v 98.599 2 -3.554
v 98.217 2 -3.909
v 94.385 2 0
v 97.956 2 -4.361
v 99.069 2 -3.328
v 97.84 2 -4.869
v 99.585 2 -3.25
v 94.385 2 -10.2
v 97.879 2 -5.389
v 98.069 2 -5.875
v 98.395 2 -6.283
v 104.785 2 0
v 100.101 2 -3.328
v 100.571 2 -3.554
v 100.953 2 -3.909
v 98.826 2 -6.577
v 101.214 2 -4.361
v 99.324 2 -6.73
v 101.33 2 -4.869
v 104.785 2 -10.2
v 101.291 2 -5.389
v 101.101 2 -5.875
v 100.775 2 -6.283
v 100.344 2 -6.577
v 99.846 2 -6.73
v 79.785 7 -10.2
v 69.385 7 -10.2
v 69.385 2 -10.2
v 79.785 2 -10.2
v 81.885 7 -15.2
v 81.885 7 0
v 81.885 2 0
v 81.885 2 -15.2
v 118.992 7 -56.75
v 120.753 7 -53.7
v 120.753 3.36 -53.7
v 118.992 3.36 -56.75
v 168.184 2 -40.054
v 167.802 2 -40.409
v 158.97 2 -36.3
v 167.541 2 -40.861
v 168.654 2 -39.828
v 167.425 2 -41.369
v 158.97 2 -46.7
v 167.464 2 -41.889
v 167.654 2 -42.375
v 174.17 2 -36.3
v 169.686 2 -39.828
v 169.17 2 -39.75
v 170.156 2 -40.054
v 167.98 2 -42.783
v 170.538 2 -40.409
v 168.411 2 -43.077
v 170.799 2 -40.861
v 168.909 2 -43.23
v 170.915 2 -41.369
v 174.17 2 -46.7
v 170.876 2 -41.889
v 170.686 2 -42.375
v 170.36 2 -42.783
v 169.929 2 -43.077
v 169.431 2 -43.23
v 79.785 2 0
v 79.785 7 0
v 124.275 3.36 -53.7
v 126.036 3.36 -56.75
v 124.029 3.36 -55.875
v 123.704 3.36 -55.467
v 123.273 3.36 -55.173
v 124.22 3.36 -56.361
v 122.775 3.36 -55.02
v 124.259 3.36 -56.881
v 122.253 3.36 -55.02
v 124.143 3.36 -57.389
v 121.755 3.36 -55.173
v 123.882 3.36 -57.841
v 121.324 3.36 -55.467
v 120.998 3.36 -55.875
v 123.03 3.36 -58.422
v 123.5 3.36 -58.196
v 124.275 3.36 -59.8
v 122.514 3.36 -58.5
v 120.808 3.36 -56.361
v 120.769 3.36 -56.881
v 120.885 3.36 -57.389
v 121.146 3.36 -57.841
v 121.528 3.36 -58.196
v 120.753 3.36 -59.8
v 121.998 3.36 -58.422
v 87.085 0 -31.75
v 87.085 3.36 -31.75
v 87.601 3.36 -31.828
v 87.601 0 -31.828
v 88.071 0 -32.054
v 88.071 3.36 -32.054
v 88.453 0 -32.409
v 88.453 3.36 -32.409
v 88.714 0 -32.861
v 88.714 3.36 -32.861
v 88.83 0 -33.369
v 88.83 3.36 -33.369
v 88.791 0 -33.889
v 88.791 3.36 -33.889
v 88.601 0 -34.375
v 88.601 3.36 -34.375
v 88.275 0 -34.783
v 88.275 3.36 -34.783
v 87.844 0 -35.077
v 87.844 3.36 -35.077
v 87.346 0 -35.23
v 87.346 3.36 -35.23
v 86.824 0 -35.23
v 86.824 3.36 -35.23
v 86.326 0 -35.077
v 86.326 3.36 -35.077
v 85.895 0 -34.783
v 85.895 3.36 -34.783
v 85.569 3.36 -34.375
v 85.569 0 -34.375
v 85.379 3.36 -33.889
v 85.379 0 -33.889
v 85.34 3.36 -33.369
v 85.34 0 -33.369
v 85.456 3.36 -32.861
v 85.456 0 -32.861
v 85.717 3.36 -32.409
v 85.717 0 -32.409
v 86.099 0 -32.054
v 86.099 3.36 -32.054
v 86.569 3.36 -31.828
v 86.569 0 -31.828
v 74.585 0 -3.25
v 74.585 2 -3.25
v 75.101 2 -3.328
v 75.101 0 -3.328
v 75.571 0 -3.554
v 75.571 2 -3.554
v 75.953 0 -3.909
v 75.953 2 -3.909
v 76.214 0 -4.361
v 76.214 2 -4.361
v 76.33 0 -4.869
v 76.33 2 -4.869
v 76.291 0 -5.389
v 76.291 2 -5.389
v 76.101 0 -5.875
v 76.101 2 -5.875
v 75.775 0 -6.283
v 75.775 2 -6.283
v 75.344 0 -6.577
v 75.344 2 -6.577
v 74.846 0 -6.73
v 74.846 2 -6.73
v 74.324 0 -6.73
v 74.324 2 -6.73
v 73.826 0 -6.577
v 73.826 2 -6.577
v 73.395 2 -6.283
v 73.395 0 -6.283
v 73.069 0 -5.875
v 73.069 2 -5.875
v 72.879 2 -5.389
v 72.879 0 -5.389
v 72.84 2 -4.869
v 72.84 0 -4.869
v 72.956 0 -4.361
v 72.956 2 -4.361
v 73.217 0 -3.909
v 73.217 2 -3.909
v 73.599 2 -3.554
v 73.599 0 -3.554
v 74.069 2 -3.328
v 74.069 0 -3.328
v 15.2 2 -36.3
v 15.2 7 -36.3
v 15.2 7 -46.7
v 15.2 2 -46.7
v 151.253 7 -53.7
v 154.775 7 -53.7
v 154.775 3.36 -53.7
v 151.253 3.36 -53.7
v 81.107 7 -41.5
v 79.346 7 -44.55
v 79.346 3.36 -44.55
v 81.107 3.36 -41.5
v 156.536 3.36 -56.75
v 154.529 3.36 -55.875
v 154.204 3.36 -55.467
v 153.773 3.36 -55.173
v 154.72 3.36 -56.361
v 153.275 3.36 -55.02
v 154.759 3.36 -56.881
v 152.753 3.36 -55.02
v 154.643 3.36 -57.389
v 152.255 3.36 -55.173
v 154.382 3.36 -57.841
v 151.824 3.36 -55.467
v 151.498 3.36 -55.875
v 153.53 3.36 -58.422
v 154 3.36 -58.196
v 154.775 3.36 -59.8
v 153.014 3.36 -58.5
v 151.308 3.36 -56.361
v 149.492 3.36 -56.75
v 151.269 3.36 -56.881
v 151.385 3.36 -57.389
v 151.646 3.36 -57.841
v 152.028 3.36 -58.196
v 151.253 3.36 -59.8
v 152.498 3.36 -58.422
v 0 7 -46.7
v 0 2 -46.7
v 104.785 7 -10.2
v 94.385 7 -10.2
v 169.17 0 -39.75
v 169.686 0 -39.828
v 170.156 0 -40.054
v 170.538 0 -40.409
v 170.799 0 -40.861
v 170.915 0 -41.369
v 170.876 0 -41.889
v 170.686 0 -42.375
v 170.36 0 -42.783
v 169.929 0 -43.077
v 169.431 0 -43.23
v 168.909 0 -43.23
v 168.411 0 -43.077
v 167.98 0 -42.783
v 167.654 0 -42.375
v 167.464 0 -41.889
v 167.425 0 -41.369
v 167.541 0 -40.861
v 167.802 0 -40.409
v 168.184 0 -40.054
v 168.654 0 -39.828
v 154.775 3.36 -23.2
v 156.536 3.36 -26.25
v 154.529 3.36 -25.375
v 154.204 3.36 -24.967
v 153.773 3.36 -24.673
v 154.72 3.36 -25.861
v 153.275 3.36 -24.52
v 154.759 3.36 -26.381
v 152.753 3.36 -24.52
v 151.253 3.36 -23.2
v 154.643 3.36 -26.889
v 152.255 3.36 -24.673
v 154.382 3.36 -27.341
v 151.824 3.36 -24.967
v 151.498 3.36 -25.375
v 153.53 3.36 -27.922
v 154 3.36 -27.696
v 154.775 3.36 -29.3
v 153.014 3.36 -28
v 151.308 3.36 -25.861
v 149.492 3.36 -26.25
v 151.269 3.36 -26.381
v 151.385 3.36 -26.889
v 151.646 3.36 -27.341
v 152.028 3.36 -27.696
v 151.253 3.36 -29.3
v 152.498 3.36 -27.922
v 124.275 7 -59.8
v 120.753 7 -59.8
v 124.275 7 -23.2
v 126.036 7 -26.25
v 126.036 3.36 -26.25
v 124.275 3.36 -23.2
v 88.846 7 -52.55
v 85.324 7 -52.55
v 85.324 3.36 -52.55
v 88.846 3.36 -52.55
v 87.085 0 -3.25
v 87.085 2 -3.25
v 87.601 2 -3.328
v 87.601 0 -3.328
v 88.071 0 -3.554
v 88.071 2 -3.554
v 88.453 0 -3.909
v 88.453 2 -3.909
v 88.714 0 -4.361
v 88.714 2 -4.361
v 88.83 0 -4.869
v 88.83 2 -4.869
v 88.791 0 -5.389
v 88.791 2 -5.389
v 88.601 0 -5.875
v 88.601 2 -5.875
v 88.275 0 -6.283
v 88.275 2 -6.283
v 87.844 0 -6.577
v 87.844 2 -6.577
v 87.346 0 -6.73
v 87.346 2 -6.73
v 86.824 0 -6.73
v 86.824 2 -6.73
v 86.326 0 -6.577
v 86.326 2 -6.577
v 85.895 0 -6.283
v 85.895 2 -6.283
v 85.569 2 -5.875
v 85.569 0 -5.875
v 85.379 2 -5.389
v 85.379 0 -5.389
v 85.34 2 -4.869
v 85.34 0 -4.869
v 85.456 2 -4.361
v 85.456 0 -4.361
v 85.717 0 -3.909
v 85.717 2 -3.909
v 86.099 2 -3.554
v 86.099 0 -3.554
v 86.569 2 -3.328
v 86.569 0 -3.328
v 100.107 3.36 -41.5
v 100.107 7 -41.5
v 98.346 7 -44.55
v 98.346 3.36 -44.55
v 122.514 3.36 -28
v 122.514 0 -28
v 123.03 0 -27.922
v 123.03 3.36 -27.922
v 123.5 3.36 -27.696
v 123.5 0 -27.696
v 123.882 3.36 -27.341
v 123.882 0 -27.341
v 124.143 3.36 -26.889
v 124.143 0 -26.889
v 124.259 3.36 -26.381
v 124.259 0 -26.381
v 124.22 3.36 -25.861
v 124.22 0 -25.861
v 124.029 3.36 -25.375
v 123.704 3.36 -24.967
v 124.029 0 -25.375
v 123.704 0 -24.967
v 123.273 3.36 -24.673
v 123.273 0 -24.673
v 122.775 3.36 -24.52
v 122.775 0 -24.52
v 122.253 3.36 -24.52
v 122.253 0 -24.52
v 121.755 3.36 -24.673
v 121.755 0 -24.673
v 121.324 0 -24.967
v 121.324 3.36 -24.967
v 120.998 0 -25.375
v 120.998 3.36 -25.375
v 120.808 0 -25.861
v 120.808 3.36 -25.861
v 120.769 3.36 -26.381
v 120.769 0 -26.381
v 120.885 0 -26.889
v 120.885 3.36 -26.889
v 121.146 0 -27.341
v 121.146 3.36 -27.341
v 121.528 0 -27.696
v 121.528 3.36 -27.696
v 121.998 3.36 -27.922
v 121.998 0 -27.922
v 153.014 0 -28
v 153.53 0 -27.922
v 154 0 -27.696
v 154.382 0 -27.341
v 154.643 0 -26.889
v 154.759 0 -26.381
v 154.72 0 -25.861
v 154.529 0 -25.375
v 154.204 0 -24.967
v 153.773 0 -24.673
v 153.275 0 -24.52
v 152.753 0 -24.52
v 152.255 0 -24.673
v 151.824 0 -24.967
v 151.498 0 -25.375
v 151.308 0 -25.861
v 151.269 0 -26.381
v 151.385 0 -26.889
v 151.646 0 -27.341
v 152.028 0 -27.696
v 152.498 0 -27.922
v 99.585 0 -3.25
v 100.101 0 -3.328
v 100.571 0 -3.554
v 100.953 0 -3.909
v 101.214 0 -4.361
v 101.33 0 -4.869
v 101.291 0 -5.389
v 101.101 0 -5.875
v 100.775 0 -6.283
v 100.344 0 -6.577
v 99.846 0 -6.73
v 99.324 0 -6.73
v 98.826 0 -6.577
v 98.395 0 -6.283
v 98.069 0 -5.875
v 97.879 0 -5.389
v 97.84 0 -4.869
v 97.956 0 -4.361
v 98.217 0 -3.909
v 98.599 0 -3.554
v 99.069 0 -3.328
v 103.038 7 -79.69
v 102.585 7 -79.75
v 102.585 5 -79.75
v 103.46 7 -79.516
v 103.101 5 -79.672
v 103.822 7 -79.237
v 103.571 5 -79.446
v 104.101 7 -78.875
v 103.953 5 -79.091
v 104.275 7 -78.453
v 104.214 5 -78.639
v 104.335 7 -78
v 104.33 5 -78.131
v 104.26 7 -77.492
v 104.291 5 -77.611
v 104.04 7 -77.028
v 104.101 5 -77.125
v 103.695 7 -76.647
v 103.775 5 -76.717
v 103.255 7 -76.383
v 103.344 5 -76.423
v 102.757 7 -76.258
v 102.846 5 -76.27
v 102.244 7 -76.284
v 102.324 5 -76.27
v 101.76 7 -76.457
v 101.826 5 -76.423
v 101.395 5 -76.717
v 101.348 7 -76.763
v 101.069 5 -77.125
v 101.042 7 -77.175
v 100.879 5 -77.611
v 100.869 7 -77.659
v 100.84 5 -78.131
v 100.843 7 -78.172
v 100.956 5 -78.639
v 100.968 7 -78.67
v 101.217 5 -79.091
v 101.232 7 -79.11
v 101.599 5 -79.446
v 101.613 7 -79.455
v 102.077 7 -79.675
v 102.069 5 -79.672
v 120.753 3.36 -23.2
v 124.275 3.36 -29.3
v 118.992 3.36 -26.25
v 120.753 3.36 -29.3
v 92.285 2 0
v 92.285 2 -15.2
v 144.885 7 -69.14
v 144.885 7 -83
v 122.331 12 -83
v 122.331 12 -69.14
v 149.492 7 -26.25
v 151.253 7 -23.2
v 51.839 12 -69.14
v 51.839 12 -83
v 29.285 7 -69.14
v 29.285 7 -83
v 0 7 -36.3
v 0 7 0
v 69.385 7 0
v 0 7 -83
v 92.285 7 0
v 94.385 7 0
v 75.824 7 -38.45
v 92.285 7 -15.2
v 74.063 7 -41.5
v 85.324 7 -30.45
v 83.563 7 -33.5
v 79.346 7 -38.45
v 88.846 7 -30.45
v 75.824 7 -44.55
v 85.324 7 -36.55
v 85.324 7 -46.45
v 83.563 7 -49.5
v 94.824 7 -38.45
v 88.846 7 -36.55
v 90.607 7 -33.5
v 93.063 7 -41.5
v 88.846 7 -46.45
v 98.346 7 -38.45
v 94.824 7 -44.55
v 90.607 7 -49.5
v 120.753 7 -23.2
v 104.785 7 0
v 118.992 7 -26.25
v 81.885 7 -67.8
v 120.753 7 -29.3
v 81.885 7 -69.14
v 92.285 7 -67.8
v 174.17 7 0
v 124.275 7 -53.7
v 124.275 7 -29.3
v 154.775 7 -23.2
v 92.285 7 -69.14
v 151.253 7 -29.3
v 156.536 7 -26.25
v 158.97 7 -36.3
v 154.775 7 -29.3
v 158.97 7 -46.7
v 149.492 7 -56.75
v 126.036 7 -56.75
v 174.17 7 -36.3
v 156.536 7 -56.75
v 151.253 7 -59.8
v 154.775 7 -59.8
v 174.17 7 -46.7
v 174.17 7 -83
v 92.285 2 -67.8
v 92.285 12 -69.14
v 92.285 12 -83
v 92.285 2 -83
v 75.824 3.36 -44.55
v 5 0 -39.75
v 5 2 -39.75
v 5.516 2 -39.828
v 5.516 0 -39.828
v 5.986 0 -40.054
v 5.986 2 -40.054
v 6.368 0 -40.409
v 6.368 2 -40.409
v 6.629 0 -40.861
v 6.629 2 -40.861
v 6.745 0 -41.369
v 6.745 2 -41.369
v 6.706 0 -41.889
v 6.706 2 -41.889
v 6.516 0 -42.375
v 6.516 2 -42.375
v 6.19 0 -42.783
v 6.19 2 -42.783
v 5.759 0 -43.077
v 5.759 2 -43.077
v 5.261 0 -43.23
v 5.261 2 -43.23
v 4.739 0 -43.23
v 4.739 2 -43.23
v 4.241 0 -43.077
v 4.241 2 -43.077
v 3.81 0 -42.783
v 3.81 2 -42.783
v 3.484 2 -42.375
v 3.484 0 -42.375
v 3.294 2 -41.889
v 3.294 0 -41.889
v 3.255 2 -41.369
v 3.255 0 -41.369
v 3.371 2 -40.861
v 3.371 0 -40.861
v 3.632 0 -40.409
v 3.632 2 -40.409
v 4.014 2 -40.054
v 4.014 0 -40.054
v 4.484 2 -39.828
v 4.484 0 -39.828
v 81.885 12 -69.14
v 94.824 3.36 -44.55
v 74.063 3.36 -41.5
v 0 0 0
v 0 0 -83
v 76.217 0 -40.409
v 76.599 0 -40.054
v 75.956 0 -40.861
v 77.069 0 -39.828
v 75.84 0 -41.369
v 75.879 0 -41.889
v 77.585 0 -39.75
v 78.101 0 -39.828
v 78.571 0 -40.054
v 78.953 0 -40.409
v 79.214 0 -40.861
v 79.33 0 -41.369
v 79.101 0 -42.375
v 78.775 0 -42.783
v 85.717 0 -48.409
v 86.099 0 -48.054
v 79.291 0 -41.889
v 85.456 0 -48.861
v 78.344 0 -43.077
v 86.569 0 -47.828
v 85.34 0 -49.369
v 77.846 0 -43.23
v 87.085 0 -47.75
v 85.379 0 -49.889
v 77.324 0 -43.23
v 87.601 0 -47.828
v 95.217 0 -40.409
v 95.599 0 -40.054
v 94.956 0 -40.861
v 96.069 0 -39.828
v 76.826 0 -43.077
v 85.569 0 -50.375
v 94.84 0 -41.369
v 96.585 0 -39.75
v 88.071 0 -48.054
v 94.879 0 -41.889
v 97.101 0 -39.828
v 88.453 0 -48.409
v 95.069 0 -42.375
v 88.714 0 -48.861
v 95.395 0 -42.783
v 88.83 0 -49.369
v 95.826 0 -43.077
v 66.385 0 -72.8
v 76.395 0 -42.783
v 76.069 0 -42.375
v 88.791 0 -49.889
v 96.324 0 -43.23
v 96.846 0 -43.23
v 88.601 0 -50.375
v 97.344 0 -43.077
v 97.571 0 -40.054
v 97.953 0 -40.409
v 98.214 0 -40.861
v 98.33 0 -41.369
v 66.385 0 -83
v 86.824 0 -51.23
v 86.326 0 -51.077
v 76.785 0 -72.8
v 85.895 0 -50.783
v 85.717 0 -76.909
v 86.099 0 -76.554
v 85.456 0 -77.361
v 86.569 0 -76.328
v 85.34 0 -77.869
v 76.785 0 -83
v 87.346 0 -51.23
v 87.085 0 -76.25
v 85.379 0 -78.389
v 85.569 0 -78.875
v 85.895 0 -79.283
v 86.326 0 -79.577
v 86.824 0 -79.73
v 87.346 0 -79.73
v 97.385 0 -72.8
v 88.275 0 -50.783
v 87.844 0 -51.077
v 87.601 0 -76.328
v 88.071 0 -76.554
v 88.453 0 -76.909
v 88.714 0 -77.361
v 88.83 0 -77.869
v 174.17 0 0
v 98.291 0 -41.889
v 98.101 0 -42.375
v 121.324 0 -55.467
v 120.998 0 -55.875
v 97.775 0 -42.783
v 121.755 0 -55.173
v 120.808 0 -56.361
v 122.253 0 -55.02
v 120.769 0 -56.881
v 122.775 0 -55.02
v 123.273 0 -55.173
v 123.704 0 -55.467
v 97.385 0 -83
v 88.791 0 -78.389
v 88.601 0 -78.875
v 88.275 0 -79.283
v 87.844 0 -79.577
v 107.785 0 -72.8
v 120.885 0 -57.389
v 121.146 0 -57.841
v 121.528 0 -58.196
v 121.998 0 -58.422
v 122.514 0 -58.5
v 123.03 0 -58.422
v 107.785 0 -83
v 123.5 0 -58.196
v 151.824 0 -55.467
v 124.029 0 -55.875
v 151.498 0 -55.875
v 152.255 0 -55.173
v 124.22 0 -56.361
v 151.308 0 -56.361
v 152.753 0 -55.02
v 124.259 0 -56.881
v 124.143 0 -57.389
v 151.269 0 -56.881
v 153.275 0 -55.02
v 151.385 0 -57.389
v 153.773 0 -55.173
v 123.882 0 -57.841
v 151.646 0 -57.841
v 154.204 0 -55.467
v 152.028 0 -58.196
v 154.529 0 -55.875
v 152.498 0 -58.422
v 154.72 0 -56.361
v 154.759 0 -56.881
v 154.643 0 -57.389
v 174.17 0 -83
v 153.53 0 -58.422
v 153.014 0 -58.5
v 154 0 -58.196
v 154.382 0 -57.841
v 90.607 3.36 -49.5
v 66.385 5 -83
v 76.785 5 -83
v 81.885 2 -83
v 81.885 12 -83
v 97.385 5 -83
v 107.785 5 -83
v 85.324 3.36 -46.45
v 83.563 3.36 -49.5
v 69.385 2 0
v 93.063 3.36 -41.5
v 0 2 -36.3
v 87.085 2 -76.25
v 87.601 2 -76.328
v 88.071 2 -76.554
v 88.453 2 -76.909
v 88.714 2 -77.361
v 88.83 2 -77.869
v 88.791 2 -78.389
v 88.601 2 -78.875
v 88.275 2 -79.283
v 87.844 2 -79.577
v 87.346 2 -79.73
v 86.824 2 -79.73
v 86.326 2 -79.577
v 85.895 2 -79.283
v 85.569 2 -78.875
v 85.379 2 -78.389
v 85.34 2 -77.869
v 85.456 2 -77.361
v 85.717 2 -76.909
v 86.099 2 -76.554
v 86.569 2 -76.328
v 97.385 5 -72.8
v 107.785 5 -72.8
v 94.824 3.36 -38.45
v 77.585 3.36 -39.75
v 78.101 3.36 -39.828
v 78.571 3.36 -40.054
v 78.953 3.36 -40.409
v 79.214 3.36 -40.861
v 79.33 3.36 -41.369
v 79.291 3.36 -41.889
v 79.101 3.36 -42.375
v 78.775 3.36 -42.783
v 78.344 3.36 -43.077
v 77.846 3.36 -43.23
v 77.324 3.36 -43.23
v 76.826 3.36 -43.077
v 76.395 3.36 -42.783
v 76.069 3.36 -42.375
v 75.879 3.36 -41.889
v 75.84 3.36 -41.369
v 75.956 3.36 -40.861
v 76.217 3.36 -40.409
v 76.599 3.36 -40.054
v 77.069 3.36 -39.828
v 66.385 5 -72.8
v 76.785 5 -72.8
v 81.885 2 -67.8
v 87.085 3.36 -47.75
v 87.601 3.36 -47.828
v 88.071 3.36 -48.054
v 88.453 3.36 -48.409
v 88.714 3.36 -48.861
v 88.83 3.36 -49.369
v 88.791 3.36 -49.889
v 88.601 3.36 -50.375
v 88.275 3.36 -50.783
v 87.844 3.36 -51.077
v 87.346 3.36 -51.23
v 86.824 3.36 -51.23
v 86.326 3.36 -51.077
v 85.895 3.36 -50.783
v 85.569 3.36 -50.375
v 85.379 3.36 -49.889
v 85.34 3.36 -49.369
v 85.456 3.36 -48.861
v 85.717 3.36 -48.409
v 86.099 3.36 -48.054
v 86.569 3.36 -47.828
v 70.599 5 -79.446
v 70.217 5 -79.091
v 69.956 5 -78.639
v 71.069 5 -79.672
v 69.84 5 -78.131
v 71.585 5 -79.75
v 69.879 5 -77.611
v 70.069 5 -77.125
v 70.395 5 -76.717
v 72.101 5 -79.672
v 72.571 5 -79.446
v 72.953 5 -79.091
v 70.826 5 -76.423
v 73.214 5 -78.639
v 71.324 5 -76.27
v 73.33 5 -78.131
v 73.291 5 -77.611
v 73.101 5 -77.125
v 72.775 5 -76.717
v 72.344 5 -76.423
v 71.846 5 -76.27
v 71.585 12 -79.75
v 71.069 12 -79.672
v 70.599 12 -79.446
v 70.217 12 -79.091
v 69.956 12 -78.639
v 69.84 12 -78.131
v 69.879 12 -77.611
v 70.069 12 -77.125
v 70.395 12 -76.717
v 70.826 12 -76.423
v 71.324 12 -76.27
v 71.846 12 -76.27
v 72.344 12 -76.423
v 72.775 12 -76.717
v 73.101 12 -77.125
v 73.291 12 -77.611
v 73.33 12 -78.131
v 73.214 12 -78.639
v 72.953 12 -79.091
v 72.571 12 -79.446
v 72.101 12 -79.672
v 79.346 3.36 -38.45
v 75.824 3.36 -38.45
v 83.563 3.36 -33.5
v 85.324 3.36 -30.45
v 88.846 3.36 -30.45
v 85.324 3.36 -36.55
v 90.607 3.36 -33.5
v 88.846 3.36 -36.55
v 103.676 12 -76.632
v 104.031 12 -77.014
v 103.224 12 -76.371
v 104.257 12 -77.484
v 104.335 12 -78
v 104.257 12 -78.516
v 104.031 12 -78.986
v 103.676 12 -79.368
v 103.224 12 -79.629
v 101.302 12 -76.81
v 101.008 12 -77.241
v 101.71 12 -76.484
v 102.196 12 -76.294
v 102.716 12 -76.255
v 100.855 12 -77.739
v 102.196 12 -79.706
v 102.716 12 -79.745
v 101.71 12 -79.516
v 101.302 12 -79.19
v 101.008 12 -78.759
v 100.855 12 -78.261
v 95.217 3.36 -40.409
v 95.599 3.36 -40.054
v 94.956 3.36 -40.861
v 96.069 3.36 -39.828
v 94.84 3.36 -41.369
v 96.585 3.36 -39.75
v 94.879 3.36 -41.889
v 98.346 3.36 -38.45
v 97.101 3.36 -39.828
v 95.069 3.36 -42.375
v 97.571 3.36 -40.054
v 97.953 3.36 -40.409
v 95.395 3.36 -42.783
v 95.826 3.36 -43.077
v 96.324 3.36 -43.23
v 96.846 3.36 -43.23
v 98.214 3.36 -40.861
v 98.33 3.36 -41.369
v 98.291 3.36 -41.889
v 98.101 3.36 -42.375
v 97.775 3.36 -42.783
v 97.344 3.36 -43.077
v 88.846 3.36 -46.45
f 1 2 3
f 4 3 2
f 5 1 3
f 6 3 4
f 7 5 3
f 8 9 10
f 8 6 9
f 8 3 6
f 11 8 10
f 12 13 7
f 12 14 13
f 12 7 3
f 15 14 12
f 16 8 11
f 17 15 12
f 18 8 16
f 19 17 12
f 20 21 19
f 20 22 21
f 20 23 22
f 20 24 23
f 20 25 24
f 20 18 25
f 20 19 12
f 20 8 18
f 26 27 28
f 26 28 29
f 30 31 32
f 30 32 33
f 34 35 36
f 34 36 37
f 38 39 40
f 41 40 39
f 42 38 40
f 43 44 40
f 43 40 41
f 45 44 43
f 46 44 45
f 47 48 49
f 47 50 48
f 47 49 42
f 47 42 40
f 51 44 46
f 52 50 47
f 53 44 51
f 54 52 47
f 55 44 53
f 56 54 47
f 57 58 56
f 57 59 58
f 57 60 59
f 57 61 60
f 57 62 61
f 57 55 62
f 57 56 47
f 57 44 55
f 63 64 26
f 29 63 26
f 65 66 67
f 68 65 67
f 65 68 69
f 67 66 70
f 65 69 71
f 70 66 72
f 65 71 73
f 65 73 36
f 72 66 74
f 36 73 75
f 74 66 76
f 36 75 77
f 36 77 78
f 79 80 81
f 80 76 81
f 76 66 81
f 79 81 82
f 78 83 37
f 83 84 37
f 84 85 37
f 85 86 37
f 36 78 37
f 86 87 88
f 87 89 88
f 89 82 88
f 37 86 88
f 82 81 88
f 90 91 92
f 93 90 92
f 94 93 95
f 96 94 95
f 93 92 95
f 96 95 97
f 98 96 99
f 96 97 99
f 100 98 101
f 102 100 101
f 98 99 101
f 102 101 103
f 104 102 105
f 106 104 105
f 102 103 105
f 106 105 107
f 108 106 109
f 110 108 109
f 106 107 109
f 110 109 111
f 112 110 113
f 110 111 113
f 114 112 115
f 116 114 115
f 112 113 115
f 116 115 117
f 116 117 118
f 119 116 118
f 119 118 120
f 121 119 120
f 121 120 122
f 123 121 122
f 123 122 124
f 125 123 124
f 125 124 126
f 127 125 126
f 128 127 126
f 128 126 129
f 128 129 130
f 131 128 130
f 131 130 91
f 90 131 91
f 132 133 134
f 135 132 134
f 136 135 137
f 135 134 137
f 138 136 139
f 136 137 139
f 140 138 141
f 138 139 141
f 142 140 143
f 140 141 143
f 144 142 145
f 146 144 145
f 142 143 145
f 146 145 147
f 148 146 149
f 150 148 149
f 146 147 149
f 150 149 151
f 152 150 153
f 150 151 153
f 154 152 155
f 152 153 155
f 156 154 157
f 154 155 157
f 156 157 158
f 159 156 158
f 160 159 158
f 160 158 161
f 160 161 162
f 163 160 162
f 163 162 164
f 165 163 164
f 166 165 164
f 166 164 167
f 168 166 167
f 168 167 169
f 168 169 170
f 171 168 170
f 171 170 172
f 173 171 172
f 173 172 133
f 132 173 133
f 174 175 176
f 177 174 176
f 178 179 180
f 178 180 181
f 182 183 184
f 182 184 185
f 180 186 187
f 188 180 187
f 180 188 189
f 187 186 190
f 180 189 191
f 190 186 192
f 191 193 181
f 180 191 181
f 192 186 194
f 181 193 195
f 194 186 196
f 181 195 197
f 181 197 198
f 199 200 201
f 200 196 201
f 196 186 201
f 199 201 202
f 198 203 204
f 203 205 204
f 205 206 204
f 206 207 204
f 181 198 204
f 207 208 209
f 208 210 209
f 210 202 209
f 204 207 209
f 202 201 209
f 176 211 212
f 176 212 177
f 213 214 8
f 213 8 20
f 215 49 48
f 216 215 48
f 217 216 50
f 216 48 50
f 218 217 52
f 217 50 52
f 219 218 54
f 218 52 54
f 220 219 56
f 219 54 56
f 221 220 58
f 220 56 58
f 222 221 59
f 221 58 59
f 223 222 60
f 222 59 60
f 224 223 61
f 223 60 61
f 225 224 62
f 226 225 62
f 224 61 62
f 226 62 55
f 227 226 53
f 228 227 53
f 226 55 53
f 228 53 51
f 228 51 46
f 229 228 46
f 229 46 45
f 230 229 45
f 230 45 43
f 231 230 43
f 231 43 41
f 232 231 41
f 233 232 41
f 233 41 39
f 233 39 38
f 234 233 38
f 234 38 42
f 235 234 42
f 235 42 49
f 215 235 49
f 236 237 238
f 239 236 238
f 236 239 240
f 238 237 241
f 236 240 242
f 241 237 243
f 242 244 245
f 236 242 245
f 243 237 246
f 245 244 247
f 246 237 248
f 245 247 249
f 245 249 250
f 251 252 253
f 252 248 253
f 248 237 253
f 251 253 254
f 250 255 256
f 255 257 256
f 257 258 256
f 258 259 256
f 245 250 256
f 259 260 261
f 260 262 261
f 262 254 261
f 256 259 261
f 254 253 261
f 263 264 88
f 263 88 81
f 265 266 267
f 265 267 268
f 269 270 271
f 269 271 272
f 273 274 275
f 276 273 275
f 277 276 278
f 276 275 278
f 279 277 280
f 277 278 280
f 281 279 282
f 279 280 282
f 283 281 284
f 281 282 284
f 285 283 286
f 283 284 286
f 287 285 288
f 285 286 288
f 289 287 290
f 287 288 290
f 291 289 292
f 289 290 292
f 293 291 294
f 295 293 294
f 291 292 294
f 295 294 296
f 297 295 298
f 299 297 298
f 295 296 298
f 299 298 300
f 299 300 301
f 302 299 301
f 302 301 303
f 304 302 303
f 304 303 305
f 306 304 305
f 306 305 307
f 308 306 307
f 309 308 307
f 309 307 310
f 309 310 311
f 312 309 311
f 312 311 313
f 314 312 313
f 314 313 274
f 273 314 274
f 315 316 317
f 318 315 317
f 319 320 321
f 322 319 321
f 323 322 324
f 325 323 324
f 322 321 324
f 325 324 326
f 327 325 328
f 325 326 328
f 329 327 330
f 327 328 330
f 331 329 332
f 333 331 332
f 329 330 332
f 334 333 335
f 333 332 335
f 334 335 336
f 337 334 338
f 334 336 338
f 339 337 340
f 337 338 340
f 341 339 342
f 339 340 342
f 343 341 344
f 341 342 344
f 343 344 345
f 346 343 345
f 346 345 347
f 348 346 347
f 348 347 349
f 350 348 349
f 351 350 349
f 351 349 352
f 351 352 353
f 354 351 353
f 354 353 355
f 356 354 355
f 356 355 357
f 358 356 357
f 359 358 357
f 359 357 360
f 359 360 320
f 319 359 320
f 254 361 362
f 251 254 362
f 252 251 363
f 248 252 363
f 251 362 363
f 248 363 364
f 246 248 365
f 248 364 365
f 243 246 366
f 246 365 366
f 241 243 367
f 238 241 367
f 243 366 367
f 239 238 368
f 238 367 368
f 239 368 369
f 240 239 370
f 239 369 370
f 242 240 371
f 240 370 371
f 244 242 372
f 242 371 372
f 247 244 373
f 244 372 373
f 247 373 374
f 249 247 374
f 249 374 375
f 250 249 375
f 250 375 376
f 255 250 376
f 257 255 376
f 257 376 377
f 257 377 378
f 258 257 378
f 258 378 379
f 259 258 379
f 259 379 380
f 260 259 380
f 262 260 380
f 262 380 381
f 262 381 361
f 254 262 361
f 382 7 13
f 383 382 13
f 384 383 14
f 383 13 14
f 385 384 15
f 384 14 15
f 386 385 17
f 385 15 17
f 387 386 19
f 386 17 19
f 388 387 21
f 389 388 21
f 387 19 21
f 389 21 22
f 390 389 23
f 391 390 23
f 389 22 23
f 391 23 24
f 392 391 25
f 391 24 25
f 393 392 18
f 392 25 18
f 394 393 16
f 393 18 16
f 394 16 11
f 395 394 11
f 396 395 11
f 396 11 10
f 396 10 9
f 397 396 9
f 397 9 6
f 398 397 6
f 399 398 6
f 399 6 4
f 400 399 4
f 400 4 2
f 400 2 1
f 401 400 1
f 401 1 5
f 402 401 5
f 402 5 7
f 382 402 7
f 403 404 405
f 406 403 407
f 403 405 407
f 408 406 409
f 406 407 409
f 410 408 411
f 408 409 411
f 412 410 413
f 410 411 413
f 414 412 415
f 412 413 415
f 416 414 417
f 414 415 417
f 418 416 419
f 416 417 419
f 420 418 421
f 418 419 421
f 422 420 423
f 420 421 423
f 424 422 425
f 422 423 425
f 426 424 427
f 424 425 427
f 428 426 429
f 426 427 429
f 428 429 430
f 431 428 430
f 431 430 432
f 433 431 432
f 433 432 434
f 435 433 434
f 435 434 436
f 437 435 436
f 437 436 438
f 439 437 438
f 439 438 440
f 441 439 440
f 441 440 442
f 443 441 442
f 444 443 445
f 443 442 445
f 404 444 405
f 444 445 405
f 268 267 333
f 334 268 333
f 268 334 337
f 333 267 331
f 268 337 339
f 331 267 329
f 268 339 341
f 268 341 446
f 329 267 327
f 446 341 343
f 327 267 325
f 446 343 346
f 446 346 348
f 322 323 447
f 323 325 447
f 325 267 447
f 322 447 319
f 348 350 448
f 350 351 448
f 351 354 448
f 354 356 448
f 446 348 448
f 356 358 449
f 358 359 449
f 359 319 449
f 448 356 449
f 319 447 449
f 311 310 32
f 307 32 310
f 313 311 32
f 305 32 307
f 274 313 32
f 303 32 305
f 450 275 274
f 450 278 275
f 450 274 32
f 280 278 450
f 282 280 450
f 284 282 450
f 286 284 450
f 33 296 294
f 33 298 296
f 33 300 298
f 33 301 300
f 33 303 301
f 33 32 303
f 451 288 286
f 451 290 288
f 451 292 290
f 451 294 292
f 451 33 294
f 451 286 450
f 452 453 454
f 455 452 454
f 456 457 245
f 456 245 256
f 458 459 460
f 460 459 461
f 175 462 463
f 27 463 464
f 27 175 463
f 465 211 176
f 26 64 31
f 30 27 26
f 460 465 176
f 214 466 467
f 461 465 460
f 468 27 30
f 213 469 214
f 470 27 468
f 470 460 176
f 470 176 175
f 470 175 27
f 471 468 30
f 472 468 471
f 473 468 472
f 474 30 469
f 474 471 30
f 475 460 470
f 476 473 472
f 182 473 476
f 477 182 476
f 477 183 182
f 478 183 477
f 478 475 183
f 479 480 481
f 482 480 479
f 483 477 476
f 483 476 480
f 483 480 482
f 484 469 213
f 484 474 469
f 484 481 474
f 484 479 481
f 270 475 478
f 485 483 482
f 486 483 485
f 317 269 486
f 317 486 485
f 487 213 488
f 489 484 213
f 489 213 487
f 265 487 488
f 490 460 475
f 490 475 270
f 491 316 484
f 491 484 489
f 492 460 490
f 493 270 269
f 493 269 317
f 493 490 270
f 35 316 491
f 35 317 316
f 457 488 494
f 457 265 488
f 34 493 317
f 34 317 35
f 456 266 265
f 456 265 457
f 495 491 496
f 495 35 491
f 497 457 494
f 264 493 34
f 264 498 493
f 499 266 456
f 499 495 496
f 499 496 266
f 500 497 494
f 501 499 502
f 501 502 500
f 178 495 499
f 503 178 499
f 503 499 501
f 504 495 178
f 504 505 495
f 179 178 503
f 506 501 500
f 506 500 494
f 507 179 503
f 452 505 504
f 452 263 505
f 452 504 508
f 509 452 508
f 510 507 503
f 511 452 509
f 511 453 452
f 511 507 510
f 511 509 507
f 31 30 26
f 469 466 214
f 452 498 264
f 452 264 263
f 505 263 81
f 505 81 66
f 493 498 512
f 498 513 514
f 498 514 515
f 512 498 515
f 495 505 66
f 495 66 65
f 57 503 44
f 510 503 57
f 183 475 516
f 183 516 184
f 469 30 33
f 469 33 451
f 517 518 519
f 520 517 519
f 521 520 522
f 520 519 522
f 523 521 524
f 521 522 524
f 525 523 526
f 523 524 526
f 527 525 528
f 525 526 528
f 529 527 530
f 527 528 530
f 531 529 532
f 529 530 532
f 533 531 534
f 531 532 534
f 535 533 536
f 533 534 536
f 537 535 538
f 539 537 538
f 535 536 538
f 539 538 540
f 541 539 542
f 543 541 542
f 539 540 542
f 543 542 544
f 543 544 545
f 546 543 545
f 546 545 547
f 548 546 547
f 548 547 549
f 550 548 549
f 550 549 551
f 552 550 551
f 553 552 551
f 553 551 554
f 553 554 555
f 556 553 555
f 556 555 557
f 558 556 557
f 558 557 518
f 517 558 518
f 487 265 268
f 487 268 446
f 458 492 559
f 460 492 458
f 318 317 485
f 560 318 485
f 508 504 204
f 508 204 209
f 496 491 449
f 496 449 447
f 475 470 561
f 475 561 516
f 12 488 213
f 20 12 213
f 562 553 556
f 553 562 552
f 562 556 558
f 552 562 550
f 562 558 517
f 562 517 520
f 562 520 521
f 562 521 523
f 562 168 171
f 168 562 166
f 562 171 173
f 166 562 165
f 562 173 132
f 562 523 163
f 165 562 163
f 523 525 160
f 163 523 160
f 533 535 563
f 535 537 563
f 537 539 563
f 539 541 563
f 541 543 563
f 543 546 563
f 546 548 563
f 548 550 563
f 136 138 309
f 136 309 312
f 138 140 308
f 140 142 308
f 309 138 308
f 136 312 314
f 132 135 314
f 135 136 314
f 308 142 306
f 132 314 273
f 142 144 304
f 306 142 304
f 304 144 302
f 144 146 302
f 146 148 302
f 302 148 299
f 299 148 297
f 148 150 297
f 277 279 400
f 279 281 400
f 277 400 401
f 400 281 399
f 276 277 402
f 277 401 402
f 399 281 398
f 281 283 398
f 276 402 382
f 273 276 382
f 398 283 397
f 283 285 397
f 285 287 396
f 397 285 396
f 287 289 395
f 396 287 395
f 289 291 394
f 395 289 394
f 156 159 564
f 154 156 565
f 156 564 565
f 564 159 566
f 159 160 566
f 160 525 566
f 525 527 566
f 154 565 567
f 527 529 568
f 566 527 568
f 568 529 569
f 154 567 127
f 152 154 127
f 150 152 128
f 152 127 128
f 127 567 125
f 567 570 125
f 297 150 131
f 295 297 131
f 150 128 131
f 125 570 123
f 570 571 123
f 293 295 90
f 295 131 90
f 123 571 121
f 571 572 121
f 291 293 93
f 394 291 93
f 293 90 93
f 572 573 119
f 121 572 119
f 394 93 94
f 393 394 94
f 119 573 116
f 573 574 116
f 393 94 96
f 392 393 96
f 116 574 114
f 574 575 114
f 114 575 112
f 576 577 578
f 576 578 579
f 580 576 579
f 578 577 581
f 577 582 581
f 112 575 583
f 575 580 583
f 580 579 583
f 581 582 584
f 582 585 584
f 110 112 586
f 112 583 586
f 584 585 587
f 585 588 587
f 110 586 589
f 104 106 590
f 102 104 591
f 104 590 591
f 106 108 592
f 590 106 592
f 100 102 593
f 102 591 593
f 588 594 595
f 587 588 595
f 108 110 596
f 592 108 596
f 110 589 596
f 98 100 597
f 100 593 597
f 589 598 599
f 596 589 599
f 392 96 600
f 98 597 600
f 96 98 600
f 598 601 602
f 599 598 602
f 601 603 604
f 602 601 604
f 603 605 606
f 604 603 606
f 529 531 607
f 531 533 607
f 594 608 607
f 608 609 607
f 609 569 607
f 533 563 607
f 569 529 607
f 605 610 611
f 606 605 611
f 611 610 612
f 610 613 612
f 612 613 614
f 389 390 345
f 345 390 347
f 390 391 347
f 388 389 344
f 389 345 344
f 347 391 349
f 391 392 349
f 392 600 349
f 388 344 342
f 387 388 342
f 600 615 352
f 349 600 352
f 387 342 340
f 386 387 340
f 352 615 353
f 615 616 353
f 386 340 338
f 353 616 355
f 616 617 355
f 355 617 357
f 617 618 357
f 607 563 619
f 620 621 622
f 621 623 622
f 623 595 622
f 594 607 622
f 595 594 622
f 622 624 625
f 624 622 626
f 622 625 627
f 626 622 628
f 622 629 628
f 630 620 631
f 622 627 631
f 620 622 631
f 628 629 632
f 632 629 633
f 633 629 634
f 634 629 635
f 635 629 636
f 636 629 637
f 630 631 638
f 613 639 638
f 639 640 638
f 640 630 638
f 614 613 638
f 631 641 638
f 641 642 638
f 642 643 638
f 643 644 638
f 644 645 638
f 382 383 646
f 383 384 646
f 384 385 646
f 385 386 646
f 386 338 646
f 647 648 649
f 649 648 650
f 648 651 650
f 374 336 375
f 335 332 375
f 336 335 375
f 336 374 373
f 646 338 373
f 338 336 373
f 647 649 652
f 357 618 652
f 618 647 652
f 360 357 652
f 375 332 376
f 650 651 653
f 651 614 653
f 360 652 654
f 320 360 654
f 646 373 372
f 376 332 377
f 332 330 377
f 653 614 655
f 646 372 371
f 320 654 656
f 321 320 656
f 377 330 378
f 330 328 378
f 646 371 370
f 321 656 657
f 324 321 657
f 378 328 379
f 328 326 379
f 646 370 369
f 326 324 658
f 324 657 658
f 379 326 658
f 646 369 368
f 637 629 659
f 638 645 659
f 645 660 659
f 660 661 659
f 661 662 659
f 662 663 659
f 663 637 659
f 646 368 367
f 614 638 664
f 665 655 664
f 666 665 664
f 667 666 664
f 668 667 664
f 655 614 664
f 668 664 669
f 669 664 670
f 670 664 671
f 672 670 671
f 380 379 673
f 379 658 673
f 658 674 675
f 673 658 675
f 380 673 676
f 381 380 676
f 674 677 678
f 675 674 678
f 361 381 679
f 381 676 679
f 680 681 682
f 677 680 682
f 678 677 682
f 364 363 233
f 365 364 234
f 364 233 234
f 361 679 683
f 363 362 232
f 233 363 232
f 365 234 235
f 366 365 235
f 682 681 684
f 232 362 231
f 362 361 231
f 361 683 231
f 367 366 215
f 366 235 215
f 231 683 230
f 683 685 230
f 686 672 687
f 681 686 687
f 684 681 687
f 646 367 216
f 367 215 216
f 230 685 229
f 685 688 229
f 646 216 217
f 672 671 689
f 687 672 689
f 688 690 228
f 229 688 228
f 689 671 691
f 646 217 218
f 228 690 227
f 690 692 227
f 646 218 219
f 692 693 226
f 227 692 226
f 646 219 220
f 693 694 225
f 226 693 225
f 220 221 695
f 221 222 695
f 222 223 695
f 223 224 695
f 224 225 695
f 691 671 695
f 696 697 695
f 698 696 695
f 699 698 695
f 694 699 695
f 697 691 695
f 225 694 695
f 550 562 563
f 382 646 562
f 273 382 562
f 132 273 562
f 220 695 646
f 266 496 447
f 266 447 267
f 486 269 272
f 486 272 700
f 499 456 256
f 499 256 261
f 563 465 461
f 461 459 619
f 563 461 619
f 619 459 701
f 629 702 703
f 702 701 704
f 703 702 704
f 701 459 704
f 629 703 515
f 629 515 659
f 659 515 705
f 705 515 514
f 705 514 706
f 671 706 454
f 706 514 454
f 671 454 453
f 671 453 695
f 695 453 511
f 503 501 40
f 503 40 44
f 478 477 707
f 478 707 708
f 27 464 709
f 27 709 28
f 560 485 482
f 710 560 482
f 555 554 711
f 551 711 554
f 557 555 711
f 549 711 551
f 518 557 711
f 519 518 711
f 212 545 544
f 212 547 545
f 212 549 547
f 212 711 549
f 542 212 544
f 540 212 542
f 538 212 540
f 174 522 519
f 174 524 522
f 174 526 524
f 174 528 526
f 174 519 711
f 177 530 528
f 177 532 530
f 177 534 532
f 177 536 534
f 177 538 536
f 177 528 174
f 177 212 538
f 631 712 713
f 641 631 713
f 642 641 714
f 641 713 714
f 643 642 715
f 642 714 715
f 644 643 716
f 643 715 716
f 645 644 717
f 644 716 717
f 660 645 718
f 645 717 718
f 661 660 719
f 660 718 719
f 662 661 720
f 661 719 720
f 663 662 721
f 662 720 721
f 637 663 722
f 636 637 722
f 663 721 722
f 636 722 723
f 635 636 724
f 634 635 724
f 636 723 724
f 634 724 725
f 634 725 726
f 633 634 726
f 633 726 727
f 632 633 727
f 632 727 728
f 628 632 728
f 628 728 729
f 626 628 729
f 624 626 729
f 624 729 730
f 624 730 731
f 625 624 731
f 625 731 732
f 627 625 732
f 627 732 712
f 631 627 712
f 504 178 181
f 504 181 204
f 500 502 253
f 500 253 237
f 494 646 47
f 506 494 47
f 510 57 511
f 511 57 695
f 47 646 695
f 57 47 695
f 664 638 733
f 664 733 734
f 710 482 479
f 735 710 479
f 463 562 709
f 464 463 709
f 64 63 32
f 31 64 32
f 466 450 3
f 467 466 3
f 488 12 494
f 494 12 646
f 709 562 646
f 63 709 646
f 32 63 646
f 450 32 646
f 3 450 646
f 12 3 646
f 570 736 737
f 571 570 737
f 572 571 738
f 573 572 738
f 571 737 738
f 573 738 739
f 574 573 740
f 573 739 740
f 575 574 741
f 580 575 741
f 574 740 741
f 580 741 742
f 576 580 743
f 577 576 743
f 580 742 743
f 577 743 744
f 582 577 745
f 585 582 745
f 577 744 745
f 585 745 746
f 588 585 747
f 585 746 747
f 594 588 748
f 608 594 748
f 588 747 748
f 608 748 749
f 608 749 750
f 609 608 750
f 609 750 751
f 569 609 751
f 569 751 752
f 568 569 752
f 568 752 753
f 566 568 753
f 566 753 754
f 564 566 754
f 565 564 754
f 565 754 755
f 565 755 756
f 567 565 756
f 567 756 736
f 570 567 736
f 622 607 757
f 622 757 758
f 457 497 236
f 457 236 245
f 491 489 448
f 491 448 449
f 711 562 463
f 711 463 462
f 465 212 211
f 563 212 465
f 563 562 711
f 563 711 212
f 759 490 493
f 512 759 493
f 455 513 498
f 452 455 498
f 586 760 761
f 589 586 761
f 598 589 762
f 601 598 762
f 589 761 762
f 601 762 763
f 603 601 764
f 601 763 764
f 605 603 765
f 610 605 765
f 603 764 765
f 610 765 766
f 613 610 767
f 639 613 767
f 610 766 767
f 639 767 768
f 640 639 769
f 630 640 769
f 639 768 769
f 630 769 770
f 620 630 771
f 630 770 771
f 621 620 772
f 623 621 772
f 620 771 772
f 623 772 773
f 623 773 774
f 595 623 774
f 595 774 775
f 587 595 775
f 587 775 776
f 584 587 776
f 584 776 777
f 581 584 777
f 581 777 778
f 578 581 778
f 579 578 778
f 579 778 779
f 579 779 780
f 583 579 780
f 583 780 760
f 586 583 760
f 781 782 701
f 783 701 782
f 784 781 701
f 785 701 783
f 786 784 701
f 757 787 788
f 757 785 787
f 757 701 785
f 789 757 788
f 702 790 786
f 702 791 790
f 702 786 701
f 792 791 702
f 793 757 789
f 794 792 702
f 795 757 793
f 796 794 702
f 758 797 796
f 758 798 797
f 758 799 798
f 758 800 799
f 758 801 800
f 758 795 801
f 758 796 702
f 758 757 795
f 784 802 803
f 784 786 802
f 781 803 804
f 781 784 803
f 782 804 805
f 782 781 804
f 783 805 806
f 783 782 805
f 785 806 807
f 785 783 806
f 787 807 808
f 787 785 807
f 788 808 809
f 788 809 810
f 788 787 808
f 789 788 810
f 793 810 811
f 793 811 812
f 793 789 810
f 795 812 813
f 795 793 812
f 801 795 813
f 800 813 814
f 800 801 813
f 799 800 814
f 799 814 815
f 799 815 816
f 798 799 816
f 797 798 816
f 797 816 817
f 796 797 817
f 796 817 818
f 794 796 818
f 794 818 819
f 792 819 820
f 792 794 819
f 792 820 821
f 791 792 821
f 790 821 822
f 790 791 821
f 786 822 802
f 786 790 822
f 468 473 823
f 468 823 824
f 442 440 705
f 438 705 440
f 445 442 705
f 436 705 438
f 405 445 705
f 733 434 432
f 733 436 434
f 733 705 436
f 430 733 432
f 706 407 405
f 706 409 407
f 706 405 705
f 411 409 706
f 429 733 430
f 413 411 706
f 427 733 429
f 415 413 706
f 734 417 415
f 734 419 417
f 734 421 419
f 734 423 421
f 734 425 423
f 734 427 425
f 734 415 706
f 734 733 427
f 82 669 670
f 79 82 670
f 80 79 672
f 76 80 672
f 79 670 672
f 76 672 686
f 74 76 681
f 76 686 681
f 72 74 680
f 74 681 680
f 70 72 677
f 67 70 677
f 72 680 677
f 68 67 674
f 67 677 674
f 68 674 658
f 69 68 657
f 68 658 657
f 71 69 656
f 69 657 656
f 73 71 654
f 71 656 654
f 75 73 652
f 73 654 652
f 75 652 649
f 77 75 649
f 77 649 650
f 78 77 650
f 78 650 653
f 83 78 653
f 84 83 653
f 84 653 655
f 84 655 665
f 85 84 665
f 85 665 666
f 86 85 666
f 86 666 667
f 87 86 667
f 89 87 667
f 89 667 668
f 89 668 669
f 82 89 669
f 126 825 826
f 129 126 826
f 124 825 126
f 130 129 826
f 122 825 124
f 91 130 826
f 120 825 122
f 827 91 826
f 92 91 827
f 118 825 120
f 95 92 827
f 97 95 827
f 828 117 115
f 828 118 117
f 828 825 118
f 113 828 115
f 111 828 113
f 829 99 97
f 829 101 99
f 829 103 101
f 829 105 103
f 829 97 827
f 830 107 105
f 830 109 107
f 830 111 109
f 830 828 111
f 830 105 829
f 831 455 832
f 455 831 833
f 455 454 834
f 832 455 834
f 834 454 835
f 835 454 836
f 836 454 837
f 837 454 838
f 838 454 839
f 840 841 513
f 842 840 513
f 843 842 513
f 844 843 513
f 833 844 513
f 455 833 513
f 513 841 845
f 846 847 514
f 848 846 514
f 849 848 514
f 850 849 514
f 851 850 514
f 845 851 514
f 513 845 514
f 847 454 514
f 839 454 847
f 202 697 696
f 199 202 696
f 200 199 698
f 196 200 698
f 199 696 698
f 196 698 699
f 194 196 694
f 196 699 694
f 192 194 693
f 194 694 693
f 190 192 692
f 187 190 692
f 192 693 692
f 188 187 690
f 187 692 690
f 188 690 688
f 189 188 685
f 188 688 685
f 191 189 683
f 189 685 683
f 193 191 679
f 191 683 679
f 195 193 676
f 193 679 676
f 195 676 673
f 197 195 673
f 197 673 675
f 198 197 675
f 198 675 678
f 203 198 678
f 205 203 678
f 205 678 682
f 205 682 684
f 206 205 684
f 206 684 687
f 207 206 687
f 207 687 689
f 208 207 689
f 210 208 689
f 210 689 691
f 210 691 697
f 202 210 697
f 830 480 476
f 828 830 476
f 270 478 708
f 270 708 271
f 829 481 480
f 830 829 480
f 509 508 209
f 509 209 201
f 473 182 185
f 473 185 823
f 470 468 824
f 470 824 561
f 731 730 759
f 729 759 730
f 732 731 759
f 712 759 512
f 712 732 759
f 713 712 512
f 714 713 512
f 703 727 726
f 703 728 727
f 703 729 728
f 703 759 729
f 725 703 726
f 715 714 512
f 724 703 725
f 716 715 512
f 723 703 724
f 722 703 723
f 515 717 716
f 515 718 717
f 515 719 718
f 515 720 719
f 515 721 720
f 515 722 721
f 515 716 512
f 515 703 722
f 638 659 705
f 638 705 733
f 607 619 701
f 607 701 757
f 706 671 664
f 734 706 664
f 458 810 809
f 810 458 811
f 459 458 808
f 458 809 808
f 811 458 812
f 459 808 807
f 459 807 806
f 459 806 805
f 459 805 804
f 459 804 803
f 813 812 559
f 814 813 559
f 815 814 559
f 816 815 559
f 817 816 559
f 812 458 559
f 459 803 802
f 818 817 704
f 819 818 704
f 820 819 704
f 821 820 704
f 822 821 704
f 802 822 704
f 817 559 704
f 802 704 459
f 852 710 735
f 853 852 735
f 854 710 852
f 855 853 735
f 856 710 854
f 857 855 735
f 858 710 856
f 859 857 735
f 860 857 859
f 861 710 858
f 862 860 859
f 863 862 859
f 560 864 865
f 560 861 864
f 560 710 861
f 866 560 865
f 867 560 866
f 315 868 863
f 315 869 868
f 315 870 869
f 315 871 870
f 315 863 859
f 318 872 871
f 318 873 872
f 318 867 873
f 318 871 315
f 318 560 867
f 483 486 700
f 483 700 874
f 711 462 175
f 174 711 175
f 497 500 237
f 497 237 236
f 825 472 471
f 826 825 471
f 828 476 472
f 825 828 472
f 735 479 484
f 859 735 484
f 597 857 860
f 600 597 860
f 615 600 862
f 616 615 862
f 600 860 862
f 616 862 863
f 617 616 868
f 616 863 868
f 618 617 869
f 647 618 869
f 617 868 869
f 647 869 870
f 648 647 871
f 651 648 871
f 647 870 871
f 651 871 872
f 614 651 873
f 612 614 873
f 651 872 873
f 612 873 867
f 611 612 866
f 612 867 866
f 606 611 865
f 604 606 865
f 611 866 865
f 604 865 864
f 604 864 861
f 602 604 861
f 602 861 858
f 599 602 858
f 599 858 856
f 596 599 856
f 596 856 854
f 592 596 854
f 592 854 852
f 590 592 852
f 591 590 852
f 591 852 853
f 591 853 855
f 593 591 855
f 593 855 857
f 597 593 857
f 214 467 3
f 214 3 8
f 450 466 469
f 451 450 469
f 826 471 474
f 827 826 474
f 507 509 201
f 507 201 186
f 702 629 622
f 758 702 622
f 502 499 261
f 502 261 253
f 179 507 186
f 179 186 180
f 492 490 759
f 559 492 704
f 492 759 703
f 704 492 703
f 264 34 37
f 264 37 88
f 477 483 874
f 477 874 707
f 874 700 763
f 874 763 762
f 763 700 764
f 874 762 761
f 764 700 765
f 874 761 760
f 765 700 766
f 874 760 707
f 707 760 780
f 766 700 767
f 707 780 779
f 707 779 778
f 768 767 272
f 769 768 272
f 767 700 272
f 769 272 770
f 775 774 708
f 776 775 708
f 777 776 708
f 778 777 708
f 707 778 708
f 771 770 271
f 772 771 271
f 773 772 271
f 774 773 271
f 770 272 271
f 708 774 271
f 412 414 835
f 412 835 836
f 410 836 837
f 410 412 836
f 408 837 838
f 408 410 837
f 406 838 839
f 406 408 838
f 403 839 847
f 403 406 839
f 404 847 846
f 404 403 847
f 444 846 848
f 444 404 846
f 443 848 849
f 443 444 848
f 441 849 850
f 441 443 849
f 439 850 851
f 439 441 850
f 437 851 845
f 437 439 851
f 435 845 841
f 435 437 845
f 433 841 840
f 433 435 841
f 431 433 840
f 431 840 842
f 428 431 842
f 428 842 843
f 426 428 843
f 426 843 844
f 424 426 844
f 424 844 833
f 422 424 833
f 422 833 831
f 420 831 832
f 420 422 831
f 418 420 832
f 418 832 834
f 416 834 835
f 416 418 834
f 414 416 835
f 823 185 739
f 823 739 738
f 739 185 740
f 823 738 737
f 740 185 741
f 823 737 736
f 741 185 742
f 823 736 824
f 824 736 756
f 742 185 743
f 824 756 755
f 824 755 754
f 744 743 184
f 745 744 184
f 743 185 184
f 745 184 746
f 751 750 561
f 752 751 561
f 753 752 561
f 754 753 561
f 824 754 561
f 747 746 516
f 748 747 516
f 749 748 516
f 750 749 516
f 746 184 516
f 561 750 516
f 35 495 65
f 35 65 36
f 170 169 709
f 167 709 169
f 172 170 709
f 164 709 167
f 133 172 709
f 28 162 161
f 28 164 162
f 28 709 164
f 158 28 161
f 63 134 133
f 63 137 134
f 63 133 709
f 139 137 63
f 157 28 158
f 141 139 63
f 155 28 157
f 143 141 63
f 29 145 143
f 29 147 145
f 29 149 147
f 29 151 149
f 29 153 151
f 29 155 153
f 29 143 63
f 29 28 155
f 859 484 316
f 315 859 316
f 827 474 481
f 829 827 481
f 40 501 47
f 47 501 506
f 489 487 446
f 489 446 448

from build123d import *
from build123d.topology import SkipClean

# Parameters (mm, degrees)
SKETCH1_W           = 174.17
SKETCH1_H           = 83
BOSS_EXTRUDE1_DEPTH = 7
SKETCH2_R           = 1.75
CUT_EXTRUDE1_DEPTH  = 194.062655374
SKETCH3_R           = 1.75
CUT_EXTRUDE2_DEPTH  = 194.062655374
SKETCH4_W           = 15.4
SKETCH4_H           = 10.4
SKETCH4_W_2         = 10.4
SKETCH4_H_2         = 15.4
CUT_EXTRUDE3_DEPTH  = 5
SKETCH5_W           = 10.4
SKETCH5_H           = 10.4
CUT_EXTRUDE4_DEPTH  = 5
SKETCH6_R           = 1.75
CUT_EXTRUDE5_DEPTH  = 194.000489378
SKETCH12_R          = 1.75
CUT_EXTRUDE9_DEPTH  = 194.062655374
CUT_EXTRUDE6_DEPTH  = 3.64
SKETCH9_W           = 10.4
SKETCH9_H           = 10.4
CUT_EXTRUDE7_DEPTH  = 5
SKETCH10_R          = 1.75
CUT_EXTRUDE8_DEPTH  = 194.000489378
SKETCH13_W          = 20.6
SKETCH13_H          = 13.86
SKETCH13_R          = 1.75
BOSS_EXTRUDE2_DEPTH = 5
CHAMFER1_SIZE       = 7.094229205
CHAMFER1_SIZE_2     = 32
MIRROR1_START       = -76.250259333
MIRROR1_DEPTH       = 7.110259333
MIRROR1_START_2     = -83
MIRROR1_2_DEPTH     = 3.2499999
MIRROR1_START_3     = -79.7500001
MIRROR1_3_DEPTH     = 3.499740767
MIRROR1_START_4     = 7
MIRROR1_4_OUTLINE_R = 1.75
MIRROR1_4_DEPTH     = 5


with BuildPart() as part:
    # Sketch1 → Boss-Extrude1 (new body)
    with BuildSketch(Plane(origin=(0, 0, 0), x_dir=(1, 0, 0), z_dir=(0, 1, 0))):
        with Locations((87.085, 41.5)):
            Rectangle(SKETCH1_W, SKETCH1_H)
    extrude(amount=BOSS_EXTRUDE1_DEPTH)

    # Sketch2 → Cut-Extrude1 (cut, through all)
    with BuildSketch(Plane(origin=(0, 7, 0), x_dir=(1, 0, 0), z_dir=(0, 1, 0))):
        with Locations(Location((87.085, 49.5, 0), (0, 0, 270))):
            Circle(SKETCH2_R)
        with Locations(Location((77.585, 41.5, 0), (0, 0, 270))):
            Circle(SKETCH2_R)
        with Locations(Location((96.585, 41.5, 0), (0, 0, 270))):
            Circle(SKETCH2_R)
        with Locations(Location((87.085, 33.5, 0), (0, 0, 270))):
            Circle(SKETCH2_R)
    extrude(amount=-CUT_EXTRUDE1_DEPTH, mode=Mode.SUBTRACT)

    # Sketch3 → Cut-Extrude2 (cut, through all)
    with BuildSketch(Plane(origin=(0, 7, 0), x_dir=(1, 0, 0), z_dir=(0, 1, 0))):
        with Locations(Location((87.085, 78, 0), (0, 0, 270))):
            Circle(SKETCH3_R)
        with Locations(Location((5, 41.5, 0), (0, 0, 270))):
            Circle(SKETCH3_R)
        with Locations(Location((87.085, 5, 0), (0, 0, 270))):
            Circle(SKETCH3_R)
        with Locations(Location((169.17, 41.5, 0), (0, 0, 270))):
            Circle(SKETCH3_R)
    extrude(amount=-CUT_EXTRUDE2_DEPTH, mode=Mode.SUBTRACT)

    # Sketch4 → Cut-Extrude3 (cut)
    with BuildSketch(Plane(origin=(0, 7, 0), x_dir=(1, 0, 0), z_dir=(0, 1, 0))):
        with Locations((7.5, 41.5)):
            Rectangle(SKETCH4_W, SKETCH4_H)
        with Locations((87.085, 7.5)):
            Rectangle(SKETCH4_W_2, SKETCH4_H_2)
        with Locations((87.085, 75.5)):
            Rectangle(SKETCH4_W_2, SKETCH4_H_2)
        with Locations((166.67, 41.5)):
            Rectangle(SKETCH4_W, SKETCH4_H)
    extrude(amount=-CUT_EXTRUDE3_DEPTH, mode=Mode.SUBTRACT)

    # Sketch5 → Cut-Extrude4 (cut)
    with BuildSketch(Plane(origin=(0, 7, 0), x_dir=(1, 0, 0), z_dir=(0, 1, 0))):
        with Locations((74.585, 5)):
            Rectangle(SKETCH5_W, SKETCH5_H)
        with Locations((99.585, 5)):
            Rectangle(SKETCH5_W, SKETCH5_H)
    extrude(amount=-CUT_EXTRUDE4_DEPTH, mode=Mode.SUBTRACT)

    # Sketch6 → Cut-Extrude5 (cut, through all)
    with BuildSketch(Plane(origin=(0, 2, 0), x_dir=(1, 0, 0), z_dir=(0, 1, 0))):
        with Locations(Location((74.585, 5, 0), (0, 0, 270))):
            Circle(SKETCH6_R)
        with Locations(Location((99.585, 5, 0), (0, 0, 270))):
            Circle(SKETCH6_R)
    extrude(amount=-CUT_EXTRUDE5_DEPTH, mode=Mode.SUBTRACT)

    # Sketch12 → Cut-Extrude9 (cut, through all)
    with BuildSketch(Plane.XZ):
        with Locations(Location((122.51393219, -26.25, 0), (0, 0, 270))):
            Circle(SKETCH12_R)
        with Locations(Location((153.01393219, -26.25, 0), (0, 0, 270))):
            Circle(SKETCH12_R)
        with Locations(Location((122.51393219, -56.75, 0), (0, 0, 270))):
            Circle(SKETCH12_R)
        with Locations(Location((153.01393219, -56.75, 0), (0, 0, 270))):
            Circle(SKETCH12_R)
    extrude(amount=-CUT_EXTRUDE9_DEPTH, mode=Mode.SUBTRACT)

    # Sketch7 → Cut-Extrude6 (cut)
    with BuildSketch(Plane(origin=(0, 7, 0), x_dir=(1, 0, 0), z_dir=(0, 1, 0))):
        Polygon((75.824081679, 44.55), (79.345918321, 44.55), (81.106836642, 41.5), (79.345918321, 38.45), (75.824081679, 38.45), (74.063163358, 41.5), align=None)
        Polygon((85.324081679, 52.55), (88.845918321, 52.55), (90.606836642, 49.5), (88.845918321, 46.45), (85.324081679, 46.45), (83.563163358, 49.5), align=None)
        Polygon((100.106836642, 41.5), (98.345918321, 44.55), (94.824081679, 44.55), (93.063163358, 41.5), (94.824081679, 38.45), (98.345918321, 38.45), align=None)
        Polygon((83.563163358, 33.5), (85.324081679, 30.45), (88.845918321, 30.45), (90.606836642, 33.5), (88.845918321, 36.55), (85.324081679, 36.55), align=None)
        Polygon((120.753013869, 29.3), (124.274850511, 29.3), (126.035768832, 26.25), (124.274850511, 23.2), (120.753013869, 23.2), (118.992095548, 26.25), align=None)
        Polygon((151.253013869, 29.3), (154.774850511, 29.3), (156.535768832, 26.25), (154.774850511, 23.2), (151.253013869, 23.2), (149.492095548, 26.25), align=None)
        Polygon((151.253013869, 59.8), (154.774850511, 59.8), (156.535768832, 56.75), (154.774850511, 53.7), (151.253013869, 53.7), (149.492095548, 56.75), align=None)
        Polygon((120.753013869, 59.8), (124.274850511, 59.8), (126.035768832, 56.75), (124.274850511, 53.7), (120.753013869, 53.7), (118.992095548, 56.75), align=None)
    extrude(amount=-CUT_EXTRUDE6_DEPTH, mode=Mode.SUBTRACT)

    # Sketch9 → Cut-Extrude7 (cut)
    with BuildSketch(Plane.XZ):
        with Locations((71.585, -78)):
            Rectangle(SKETCH9_W, SKETCH9_H)
        with Locations((102.585, -78)):
            Rectangle(SKETCH9_W, SKETCH9_H)
    extrude(amount=-CUT_EXTRUDE7_DEPTH, mode=Mode.SUBTRACT)

    # Sketch10 → Cut-Extrude8 (cut, through all)
    with BuildSketch(Plane.XZ.offset(-5)):
        with Locations(Location((71.585, -78, 0), (0, 0, 270))):
            Circle(SKETCH10_R)
        with Locations(Location((102.585, -78, 0), (0, 0, 270))):
            Circle(SKETCH10_R)
    extrude(amount=-CUT_EXTRUDE8_DEPTH, mode=Mode.SUBTRACT)

    # Sketch13 → Boss-Extrude2 (add)
    with BuildSketch(Plane(origin=(0, 7, 0), x_dir=(1, 0, 0), z_dir=(0, 1, 0))):
        with Locations((71.585, 76.07)):
            Rectangle(SKETCH13_W, SKETCH13_H)
        with Locations(Location((71.585, 78, 0), (0, 0, 90))):
            Circle(SKETCH13_R, mode=Mode.SUBTRACT)
    extrude(amount=BOSS_EXTRUDE2_DEPTH)

    # Chamfer1
    # the kernel refuses this chamfer: 32, 7.094229205 mm, written as the material it adds along each edge
    with BuildSketch(Plane(origin=(61.285, 7, -83), x_dir=(0, 1, 0), z_dir=(0, 0, 1))) as chamfer1_piece_1_section:
        Polygon((CHAMFER1_SIZE, 0), (0, CHAMFER1_SIZE_2), (0, 0), align=None)
    chamfer1_piece_1 = extrude(amount=13.86, mode=Mode.PRIVATE)
    chamfer1_piece_1 = split(chamfer1_piece_1, bisect_by=Plane(origin=(61.285, 12, -83), z_dir=(0, -1, 0)), keep=Keep.TOP, mode=Mode.PRIVATE)
    add(chamfer1_piece_1)

    # Mirror1: read off the stored shape, not the designer's step
    # Mirror1 outline → Mirror1 (add)
    with BuildSketch(Plane.XY.offset(MIRROR1_START)):
        Polygon((92.285, 12), (92.285, 7), (144.885, 7), (122.331457482, 12), align=None)
    extrude(amount=MIRROR1_DEPTH)

    # Mirror1 2 outline → Mirror1 2 (add)
    with BuildSketch(Plane.XY.offset(MIRROR1_START_2)):
        Polygon((92.285, 12), (92.285, 7), (144.885, 7), (122.331457482, 12), align=None)
    extrude(amount=MIRROR1_2_DEPTH)

    # Mirror1 3 outline → Mirror1 3 (add)
    with BuildSketch(Plane.XY.offset(MIRROR1_START_3)):
        Polygon((92.285, 12), (92.285, 7), (144.885, 7), (122.331457482, 12), align=None)
    extrude(amount=MIRROR1_3_DEPTH)

    # Mirror1 4 outline → Mirror1 4 (cut)
    with SkipClean():  # the faces are left unmerged after this step: merging them gives an invalid solid
        with BuildSketch(Plane(origin=(0, 0, 0), x_dir=(1, 0, 0), z_dir=(0, 1, 0)).offset(MIRROR1_START_4)):
            with Locations((102.585, 78)):
                Circle(MIRROR1_4_OUTLINE_R)
        extrude(amount=MIRROR1_4_DEPTH, mode=Mode.SUBTRACT)
    add(part.part.scale(1), mode=Mode.REPLACE)  # the faces are merged on a copy


solid = part.part
